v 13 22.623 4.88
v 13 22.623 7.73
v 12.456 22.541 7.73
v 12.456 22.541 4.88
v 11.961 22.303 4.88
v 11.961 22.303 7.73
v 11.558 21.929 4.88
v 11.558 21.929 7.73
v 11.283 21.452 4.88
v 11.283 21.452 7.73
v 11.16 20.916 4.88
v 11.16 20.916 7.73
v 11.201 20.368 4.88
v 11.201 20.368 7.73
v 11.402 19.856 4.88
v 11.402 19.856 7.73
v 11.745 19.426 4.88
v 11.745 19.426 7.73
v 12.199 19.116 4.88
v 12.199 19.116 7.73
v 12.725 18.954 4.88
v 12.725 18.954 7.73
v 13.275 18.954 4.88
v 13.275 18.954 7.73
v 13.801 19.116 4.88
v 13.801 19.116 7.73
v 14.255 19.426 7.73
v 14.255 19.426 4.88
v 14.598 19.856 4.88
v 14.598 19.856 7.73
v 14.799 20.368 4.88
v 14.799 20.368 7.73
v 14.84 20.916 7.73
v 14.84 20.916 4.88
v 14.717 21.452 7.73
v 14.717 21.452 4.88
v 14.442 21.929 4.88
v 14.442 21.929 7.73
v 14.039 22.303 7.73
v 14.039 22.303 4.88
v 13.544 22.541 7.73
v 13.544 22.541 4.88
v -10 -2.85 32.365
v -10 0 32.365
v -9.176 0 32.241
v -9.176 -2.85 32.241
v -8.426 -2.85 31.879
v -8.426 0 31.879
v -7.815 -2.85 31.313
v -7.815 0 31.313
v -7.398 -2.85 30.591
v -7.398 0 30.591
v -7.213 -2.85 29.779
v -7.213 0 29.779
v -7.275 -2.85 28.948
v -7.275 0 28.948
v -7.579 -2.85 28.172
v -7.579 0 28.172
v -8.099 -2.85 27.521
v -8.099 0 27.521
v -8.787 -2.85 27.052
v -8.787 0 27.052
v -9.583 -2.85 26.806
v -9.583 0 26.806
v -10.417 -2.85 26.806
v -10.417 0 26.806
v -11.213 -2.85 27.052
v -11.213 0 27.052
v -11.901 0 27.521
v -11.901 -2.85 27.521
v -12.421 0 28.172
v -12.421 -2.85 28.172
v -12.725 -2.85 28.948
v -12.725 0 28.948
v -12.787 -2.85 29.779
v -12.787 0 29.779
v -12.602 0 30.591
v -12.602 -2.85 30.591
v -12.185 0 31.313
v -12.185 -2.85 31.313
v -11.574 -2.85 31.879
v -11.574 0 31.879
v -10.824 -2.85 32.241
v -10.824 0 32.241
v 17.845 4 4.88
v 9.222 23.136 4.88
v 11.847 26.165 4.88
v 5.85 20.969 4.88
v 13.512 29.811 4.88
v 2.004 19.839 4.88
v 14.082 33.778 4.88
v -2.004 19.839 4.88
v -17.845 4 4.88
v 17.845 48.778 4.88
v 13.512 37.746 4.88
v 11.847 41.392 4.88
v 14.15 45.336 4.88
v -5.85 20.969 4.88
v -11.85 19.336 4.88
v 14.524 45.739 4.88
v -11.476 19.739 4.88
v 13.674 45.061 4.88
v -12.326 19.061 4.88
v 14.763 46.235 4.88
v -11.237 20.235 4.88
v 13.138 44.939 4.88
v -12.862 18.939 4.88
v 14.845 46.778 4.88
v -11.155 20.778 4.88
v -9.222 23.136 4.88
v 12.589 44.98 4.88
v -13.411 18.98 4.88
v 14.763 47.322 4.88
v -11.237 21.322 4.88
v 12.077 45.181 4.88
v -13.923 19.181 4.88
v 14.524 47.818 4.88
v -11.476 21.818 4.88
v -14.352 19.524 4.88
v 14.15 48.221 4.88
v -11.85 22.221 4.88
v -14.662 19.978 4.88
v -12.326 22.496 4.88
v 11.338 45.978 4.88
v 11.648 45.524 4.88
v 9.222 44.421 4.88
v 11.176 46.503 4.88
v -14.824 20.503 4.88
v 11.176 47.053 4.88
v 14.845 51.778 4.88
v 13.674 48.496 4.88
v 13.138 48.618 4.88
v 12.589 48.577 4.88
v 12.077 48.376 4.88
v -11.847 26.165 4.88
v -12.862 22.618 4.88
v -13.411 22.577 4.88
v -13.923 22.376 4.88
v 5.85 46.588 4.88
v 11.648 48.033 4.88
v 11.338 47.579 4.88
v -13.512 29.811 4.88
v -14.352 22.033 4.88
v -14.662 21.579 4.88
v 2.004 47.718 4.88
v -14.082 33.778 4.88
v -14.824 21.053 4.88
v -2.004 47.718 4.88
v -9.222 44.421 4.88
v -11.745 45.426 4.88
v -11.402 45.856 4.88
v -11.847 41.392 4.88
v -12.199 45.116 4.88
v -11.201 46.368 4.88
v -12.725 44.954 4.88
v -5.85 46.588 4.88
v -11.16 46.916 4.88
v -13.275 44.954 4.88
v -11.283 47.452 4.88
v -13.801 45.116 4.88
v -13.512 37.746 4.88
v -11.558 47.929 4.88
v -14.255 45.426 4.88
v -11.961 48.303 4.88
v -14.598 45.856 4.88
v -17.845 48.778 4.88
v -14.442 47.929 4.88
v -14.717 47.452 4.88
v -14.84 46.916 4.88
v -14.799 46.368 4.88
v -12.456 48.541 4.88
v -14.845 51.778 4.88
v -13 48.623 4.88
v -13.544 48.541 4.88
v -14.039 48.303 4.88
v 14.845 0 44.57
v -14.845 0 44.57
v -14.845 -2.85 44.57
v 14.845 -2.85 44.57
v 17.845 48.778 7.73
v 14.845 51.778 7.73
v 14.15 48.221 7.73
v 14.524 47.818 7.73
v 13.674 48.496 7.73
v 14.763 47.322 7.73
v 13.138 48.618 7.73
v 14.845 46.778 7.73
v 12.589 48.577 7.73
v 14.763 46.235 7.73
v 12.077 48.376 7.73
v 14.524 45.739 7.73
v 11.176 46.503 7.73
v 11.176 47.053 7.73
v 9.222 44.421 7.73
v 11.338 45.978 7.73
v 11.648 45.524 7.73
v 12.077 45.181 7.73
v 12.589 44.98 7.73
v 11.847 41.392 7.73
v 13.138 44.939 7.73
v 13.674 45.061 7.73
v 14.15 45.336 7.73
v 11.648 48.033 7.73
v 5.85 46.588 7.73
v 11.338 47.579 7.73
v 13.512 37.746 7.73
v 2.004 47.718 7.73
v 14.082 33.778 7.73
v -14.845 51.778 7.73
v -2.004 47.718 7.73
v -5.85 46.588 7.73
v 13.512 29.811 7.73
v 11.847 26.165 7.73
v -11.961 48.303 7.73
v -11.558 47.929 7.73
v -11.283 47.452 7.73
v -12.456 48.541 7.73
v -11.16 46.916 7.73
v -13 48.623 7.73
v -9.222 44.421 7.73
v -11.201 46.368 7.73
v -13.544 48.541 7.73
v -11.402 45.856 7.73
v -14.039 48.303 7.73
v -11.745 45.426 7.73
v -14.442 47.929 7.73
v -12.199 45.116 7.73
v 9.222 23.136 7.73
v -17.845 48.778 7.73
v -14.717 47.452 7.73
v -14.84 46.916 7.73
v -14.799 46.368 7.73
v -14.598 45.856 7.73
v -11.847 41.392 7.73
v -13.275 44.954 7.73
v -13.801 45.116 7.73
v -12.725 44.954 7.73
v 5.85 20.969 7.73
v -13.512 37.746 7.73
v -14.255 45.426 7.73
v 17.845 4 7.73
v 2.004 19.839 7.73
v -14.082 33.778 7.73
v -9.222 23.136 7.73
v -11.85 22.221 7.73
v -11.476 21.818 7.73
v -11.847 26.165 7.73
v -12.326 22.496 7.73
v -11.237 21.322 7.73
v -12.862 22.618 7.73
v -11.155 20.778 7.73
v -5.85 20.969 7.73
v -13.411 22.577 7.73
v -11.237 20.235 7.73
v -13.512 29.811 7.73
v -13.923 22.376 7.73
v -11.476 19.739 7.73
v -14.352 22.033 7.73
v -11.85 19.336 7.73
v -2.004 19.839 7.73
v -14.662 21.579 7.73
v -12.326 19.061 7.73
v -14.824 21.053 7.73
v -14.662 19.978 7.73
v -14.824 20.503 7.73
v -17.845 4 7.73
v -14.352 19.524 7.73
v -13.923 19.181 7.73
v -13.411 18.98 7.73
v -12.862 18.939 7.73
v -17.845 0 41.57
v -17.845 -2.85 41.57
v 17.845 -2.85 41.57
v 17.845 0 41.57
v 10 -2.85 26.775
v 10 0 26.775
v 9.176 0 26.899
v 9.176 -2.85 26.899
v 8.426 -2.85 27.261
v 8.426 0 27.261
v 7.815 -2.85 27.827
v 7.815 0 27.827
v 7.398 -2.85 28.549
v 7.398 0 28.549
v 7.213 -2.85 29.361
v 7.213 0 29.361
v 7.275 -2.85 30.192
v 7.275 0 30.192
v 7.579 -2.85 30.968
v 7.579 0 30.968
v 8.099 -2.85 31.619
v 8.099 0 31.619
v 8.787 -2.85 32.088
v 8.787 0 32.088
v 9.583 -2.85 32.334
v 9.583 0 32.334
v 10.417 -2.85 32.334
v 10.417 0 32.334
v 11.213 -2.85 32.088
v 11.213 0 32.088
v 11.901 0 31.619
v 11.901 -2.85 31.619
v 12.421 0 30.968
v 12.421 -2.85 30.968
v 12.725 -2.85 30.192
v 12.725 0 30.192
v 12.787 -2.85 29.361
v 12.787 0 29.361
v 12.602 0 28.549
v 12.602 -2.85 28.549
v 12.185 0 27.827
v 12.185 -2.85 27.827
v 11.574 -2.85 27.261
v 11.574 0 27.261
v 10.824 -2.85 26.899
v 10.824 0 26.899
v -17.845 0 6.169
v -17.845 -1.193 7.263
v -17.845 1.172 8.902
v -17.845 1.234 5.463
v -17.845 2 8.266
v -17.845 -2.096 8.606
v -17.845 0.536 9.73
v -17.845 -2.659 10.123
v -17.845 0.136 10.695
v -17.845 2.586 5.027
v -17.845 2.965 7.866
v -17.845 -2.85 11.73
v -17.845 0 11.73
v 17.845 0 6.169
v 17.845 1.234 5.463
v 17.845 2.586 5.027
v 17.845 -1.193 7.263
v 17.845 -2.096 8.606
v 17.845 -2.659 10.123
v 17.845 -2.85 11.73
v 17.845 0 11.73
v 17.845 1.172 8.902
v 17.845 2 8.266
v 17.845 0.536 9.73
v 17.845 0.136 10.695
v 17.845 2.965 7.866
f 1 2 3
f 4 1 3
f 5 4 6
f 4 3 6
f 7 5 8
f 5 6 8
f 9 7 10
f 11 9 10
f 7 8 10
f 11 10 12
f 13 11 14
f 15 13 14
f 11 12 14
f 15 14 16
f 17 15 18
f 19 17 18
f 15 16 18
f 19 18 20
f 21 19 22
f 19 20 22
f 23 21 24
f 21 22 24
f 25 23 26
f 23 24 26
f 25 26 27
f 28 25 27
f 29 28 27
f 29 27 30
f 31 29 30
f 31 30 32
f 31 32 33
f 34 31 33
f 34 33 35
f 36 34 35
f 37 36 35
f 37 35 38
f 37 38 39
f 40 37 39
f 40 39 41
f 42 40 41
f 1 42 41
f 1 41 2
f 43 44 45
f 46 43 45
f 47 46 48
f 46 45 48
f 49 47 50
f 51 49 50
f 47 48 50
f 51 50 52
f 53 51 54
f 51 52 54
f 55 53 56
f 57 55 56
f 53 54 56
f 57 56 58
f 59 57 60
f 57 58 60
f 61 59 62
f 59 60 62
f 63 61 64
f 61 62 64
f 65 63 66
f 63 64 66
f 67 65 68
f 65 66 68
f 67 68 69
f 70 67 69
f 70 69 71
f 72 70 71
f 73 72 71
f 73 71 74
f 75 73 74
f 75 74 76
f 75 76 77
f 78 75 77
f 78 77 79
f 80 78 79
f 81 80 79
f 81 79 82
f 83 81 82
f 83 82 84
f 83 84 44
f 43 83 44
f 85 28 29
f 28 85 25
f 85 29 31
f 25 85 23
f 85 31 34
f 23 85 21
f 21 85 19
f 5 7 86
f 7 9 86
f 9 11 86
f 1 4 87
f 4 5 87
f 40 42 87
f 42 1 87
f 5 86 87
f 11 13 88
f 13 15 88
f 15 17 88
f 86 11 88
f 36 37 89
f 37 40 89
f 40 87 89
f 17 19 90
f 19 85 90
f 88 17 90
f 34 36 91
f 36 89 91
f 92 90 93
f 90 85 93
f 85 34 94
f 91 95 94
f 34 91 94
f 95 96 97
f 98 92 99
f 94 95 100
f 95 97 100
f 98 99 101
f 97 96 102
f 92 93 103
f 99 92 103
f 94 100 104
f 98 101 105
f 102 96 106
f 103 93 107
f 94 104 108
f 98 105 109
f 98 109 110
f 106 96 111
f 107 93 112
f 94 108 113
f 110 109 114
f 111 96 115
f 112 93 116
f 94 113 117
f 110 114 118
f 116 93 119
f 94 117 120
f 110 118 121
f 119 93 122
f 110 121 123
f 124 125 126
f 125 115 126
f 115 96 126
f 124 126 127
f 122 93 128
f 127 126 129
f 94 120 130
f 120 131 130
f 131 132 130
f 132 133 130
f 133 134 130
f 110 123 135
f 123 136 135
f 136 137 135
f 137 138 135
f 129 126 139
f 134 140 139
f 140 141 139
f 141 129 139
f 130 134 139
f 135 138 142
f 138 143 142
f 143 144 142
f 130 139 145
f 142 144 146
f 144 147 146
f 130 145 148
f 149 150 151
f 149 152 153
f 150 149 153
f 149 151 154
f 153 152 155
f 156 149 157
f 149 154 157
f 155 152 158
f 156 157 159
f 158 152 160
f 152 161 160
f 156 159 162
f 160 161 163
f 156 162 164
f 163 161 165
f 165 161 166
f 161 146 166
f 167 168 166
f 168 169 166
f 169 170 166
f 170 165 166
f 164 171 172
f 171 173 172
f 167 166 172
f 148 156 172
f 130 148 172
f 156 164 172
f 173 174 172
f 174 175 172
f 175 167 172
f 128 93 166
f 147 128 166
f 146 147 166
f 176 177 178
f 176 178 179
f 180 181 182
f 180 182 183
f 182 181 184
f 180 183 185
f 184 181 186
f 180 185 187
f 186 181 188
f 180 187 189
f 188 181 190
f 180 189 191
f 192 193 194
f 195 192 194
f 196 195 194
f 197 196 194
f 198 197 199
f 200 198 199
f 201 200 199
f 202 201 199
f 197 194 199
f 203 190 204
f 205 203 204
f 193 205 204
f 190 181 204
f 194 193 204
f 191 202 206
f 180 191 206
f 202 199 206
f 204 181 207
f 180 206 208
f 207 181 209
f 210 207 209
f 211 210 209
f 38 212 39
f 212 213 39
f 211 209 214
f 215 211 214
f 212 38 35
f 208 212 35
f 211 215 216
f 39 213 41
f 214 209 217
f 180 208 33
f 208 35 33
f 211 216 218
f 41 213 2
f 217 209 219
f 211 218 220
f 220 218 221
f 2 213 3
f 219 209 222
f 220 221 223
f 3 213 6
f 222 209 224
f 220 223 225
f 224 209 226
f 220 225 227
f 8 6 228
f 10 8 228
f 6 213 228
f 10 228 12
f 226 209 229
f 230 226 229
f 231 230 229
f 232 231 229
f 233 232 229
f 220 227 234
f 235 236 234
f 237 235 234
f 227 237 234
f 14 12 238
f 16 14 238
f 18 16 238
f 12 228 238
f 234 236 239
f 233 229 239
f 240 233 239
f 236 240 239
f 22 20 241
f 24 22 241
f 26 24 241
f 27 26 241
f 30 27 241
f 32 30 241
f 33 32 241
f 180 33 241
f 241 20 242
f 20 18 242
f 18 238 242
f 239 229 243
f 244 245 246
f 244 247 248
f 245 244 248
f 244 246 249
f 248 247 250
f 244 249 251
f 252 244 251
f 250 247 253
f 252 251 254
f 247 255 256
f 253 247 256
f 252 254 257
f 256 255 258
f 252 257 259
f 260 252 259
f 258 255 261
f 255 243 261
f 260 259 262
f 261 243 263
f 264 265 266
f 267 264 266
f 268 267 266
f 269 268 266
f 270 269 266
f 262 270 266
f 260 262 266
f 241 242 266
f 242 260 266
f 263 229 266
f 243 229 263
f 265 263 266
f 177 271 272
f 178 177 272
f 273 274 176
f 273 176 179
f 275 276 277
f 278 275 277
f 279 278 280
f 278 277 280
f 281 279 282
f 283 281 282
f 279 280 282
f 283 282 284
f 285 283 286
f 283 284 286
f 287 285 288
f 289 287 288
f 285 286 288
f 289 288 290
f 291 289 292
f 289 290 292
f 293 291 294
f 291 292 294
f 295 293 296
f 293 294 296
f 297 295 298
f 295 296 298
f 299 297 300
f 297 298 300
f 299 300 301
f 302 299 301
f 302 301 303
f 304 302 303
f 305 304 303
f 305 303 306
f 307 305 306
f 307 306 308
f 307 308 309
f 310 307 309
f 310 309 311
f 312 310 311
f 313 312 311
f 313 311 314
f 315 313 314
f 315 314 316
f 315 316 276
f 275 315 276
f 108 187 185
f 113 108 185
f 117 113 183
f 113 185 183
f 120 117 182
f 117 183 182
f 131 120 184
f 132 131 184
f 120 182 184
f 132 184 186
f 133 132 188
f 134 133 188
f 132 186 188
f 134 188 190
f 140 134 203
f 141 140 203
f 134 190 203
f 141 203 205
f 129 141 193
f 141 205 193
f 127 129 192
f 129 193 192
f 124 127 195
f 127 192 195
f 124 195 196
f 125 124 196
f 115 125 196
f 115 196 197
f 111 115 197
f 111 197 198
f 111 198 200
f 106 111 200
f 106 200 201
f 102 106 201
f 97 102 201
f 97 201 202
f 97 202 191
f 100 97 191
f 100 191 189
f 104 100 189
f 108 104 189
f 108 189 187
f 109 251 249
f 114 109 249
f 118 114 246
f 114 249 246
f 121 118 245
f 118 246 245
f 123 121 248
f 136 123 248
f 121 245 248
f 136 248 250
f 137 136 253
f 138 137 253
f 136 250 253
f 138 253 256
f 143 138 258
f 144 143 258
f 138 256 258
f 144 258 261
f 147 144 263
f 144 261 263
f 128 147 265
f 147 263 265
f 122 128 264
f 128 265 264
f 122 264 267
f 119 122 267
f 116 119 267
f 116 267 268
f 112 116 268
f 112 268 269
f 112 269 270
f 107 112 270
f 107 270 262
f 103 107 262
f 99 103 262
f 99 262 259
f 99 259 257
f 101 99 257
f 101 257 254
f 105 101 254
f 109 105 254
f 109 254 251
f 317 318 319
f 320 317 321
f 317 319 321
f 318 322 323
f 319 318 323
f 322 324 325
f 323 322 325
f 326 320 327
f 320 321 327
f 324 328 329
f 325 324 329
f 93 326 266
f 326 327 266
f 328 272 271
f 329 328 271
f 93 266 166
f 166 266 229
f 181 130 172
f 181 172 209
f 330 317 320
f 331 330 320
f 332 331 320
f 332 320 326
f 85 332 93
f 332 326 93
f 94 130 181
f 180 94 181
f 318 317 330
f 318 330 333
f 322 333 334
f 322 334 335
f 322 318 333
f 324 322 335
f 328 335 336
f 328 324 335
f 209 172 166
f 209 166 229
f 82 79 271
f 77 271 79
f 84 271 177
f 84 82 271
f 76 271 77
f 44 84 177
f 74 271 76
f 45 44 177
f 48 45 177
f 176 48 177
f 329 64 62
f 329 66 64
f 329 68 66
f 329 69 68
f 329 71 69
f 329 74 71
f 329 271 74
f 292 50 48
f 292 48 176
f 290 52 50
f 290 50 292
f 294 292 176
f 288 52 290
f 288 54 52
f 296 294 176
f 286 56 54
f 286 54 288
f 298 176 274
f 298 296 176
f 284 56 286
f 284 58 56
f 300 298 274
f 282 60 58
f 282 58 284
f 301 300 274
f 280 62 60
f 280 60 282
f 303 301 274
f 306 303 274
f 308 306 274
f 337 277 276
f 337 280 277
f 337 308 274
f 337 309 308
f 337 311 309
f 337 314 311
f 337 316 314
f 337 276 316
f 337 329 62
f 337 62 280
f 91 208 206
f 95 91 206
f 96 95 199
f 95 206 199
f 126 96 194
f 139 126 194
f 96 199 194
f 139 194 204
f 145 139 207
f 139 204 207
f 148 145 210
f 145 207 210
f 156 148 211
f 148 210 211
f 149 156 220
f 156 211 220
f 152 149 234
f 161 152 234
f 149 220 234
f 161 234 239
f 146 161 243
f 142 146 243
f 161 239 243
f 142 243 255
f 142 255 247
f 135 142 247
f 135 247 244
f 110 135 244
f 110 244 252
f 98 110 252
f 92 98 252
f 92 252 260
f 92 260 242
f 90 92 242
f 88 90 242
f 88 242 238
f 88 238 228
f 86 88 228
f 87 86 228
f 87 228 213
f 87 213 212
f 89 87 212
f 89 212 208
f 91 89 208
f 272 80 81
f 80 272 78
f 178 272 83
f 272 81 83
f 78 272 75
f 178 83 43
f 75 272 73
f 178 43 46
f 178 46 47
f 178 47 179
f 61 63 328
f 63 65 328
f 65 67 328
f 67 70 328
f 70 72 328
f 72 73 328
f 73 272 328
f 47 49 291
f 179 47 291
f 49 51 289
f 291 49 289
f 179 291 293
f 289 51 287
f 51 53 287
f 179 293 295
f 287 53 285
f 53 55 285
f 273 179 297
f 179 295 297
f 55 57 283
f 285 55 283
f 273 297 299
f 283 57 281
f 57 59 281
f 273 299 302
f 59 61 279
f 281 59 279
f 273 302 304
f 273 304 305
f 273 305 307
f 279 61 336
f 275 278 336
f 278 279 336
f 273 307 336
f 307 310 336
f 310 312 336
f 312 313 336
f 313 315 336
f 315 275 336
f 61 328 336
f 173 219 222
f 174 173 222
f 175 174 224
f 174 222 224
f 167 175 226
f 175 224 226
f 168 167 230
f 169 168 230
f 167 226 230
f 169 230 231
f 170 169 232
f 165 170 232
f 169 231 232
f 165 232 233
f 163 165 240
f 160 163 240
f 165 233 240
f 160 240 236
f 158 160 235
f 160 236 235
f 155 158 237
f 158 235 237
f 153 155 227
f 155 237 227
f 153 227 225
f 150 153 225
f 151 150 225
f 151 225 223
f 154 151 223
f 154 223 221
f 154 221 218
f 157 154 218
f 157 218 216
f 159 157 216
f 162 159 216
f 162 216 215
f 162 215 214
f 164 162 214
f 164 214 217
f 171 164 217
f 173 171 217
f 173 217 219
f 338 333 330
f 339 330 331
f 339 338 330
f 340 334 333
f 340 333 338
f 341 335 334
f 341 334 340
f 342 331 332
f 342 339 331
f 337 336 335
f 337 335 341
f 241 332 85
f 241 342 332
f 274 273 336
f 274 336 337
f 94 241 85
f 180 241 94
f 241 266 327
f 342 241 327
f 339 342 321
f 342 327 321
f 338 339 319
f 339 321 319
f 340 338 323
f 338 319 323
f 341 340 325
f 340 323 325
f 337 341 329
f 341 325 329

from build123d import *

# Parameters (mm, degrees)
SKETCH_1_W             = 35.69
SKETCH_1_H             = 89.14
SM_BASE_FLANGE_1_DEPTH = 2.85
OTHER_START            = -17.845
OTHER_1_DEPTH          = 35.69
OTHER_1_2_DEPTH        = 35.69
SKETCH_7_R             = 14.0825
SKETCH_7_R_2           = 1.845
CUT_EXTRUDE_1_DEPTH    = 10
CHAMFER_1_SIZE         = 3
SKETCH_8_R             = 2.795
CUT_EXTRUDE_2_DEPTH    = 10


# Read off the part's stored shape, not the designer's step: Нарисованный сгиб1
# Sheet-metal steps are written as plain solids
with BuildPart() as part:
    # Sketch 1 → Базовая кромка1 (new body)
    with BuildSketch(Plane(origin=(0, 0, 0), x_dir=(1, 0, 0), z_dir=(0, 1, 0))):
        Rectangle(SKETCH_1_W, SKETCH_1_H)
    extrude(amount=-SM_BASE_FLANGE_1_DEPTH)

    # Other 1 outline → Other 1 (cut)
    with BuildSketch(Plane.YZ.offset(OTHER_START)):
        with BuildLine():
            Line((0, -44.57), (0, 6.169199698))
            ThreePointArc((0, 6.169199698), (-2.096002789, 8.605700079), (-2.85, 11.73))
            Line((-2.85, 11.73), (-2.85, -44.57))
            Line((-2.85, -44.57), (0, -44.57))
        make_face()
    extrude(amount=OTHER_1_DEPTH, mode=Mode.SUBTRACT)

    # Other 1 2 outline → Other 1 2 (add)
    with BuildSketch(Plane.YZ.offset(OTHER_START)):
        with BuildLine():
            Line((51.778429927, 7.73), (4, 7.73))
            ThreePointArc((4, 7.73), (1.171572875, 8.901572875), (0, 11.73))
            Line((0, 11.73), (0, 6.169199698))
            ThreePointArc((0, 6.169199698), (1.898688751, 5.210261429), (4, 4.88))
            Line((4, 4.88), (51.778429927, 4.88))
            Line((51.778429927, 4.88), (51.778429927, 7.73))
        make_face()
    extrude(amount=OTHER_1_2_DEPTH)

    # Эскиз7 → Вырез-Вытянуть1 (cut)
    with BuildSketch(Plane.XY.offset(7.73)):
        with Locations((0, 33.778429927)):
            Circle(SKETCH_7_R)
        with Locations((13, 46.778429927)):
            Circle(SKETCH_7_R_2)
        with Locations(Location((-13, 46.778429927, 0), (0, 0, 90))):
            Circle(SKETCH_7_R_2)
        with Locations((-13, 20.778429927)):
            Circle(SKETCH_7_R_2)
        with Locations(Location((13, 20.778429927, 0), (0, 0, 90))):
            Circle(SKETCH_7_R_2)
    extrude(amount=-CUT_EXTRUDE_1_DEPTH, mode=Mode.SUBTRACT)

    # Фаска1
    chamfer_1_edges = [part.edges().sort_by_distance(p)[0] for p in [
        (17.845, -1.425, 44.57),
        (-17.845, -1.425, 44.57),
        (-17.845, 51.778429927, 6.305),
        (17.845, 51.778429927, 6.305),
    ]]
    chamfer(chamfer_1_edges, length=CHAMFER_1_SIZE)

    # Эскиз8 → Вырез-Вытянуть2 (cut)
    with BuildSketch(Plane(origin=(0, 0, 0), x_dir=(1, 0, 0), z_dir=(0, 1, 0))):
        with Locations(Location((-10, -29.57, 0), (0, 0, 270))):
            Circle(SKETCH_8_R)
        with Locations(Location((10, -29.57, 0), (0, 0, 90))):
            Circle(SKETCH_8_R)
    extrude(amount=-CUT_EXTRUDE_2_DEPTH, mode=Mode.SUBTRACT)


solid = part.part
